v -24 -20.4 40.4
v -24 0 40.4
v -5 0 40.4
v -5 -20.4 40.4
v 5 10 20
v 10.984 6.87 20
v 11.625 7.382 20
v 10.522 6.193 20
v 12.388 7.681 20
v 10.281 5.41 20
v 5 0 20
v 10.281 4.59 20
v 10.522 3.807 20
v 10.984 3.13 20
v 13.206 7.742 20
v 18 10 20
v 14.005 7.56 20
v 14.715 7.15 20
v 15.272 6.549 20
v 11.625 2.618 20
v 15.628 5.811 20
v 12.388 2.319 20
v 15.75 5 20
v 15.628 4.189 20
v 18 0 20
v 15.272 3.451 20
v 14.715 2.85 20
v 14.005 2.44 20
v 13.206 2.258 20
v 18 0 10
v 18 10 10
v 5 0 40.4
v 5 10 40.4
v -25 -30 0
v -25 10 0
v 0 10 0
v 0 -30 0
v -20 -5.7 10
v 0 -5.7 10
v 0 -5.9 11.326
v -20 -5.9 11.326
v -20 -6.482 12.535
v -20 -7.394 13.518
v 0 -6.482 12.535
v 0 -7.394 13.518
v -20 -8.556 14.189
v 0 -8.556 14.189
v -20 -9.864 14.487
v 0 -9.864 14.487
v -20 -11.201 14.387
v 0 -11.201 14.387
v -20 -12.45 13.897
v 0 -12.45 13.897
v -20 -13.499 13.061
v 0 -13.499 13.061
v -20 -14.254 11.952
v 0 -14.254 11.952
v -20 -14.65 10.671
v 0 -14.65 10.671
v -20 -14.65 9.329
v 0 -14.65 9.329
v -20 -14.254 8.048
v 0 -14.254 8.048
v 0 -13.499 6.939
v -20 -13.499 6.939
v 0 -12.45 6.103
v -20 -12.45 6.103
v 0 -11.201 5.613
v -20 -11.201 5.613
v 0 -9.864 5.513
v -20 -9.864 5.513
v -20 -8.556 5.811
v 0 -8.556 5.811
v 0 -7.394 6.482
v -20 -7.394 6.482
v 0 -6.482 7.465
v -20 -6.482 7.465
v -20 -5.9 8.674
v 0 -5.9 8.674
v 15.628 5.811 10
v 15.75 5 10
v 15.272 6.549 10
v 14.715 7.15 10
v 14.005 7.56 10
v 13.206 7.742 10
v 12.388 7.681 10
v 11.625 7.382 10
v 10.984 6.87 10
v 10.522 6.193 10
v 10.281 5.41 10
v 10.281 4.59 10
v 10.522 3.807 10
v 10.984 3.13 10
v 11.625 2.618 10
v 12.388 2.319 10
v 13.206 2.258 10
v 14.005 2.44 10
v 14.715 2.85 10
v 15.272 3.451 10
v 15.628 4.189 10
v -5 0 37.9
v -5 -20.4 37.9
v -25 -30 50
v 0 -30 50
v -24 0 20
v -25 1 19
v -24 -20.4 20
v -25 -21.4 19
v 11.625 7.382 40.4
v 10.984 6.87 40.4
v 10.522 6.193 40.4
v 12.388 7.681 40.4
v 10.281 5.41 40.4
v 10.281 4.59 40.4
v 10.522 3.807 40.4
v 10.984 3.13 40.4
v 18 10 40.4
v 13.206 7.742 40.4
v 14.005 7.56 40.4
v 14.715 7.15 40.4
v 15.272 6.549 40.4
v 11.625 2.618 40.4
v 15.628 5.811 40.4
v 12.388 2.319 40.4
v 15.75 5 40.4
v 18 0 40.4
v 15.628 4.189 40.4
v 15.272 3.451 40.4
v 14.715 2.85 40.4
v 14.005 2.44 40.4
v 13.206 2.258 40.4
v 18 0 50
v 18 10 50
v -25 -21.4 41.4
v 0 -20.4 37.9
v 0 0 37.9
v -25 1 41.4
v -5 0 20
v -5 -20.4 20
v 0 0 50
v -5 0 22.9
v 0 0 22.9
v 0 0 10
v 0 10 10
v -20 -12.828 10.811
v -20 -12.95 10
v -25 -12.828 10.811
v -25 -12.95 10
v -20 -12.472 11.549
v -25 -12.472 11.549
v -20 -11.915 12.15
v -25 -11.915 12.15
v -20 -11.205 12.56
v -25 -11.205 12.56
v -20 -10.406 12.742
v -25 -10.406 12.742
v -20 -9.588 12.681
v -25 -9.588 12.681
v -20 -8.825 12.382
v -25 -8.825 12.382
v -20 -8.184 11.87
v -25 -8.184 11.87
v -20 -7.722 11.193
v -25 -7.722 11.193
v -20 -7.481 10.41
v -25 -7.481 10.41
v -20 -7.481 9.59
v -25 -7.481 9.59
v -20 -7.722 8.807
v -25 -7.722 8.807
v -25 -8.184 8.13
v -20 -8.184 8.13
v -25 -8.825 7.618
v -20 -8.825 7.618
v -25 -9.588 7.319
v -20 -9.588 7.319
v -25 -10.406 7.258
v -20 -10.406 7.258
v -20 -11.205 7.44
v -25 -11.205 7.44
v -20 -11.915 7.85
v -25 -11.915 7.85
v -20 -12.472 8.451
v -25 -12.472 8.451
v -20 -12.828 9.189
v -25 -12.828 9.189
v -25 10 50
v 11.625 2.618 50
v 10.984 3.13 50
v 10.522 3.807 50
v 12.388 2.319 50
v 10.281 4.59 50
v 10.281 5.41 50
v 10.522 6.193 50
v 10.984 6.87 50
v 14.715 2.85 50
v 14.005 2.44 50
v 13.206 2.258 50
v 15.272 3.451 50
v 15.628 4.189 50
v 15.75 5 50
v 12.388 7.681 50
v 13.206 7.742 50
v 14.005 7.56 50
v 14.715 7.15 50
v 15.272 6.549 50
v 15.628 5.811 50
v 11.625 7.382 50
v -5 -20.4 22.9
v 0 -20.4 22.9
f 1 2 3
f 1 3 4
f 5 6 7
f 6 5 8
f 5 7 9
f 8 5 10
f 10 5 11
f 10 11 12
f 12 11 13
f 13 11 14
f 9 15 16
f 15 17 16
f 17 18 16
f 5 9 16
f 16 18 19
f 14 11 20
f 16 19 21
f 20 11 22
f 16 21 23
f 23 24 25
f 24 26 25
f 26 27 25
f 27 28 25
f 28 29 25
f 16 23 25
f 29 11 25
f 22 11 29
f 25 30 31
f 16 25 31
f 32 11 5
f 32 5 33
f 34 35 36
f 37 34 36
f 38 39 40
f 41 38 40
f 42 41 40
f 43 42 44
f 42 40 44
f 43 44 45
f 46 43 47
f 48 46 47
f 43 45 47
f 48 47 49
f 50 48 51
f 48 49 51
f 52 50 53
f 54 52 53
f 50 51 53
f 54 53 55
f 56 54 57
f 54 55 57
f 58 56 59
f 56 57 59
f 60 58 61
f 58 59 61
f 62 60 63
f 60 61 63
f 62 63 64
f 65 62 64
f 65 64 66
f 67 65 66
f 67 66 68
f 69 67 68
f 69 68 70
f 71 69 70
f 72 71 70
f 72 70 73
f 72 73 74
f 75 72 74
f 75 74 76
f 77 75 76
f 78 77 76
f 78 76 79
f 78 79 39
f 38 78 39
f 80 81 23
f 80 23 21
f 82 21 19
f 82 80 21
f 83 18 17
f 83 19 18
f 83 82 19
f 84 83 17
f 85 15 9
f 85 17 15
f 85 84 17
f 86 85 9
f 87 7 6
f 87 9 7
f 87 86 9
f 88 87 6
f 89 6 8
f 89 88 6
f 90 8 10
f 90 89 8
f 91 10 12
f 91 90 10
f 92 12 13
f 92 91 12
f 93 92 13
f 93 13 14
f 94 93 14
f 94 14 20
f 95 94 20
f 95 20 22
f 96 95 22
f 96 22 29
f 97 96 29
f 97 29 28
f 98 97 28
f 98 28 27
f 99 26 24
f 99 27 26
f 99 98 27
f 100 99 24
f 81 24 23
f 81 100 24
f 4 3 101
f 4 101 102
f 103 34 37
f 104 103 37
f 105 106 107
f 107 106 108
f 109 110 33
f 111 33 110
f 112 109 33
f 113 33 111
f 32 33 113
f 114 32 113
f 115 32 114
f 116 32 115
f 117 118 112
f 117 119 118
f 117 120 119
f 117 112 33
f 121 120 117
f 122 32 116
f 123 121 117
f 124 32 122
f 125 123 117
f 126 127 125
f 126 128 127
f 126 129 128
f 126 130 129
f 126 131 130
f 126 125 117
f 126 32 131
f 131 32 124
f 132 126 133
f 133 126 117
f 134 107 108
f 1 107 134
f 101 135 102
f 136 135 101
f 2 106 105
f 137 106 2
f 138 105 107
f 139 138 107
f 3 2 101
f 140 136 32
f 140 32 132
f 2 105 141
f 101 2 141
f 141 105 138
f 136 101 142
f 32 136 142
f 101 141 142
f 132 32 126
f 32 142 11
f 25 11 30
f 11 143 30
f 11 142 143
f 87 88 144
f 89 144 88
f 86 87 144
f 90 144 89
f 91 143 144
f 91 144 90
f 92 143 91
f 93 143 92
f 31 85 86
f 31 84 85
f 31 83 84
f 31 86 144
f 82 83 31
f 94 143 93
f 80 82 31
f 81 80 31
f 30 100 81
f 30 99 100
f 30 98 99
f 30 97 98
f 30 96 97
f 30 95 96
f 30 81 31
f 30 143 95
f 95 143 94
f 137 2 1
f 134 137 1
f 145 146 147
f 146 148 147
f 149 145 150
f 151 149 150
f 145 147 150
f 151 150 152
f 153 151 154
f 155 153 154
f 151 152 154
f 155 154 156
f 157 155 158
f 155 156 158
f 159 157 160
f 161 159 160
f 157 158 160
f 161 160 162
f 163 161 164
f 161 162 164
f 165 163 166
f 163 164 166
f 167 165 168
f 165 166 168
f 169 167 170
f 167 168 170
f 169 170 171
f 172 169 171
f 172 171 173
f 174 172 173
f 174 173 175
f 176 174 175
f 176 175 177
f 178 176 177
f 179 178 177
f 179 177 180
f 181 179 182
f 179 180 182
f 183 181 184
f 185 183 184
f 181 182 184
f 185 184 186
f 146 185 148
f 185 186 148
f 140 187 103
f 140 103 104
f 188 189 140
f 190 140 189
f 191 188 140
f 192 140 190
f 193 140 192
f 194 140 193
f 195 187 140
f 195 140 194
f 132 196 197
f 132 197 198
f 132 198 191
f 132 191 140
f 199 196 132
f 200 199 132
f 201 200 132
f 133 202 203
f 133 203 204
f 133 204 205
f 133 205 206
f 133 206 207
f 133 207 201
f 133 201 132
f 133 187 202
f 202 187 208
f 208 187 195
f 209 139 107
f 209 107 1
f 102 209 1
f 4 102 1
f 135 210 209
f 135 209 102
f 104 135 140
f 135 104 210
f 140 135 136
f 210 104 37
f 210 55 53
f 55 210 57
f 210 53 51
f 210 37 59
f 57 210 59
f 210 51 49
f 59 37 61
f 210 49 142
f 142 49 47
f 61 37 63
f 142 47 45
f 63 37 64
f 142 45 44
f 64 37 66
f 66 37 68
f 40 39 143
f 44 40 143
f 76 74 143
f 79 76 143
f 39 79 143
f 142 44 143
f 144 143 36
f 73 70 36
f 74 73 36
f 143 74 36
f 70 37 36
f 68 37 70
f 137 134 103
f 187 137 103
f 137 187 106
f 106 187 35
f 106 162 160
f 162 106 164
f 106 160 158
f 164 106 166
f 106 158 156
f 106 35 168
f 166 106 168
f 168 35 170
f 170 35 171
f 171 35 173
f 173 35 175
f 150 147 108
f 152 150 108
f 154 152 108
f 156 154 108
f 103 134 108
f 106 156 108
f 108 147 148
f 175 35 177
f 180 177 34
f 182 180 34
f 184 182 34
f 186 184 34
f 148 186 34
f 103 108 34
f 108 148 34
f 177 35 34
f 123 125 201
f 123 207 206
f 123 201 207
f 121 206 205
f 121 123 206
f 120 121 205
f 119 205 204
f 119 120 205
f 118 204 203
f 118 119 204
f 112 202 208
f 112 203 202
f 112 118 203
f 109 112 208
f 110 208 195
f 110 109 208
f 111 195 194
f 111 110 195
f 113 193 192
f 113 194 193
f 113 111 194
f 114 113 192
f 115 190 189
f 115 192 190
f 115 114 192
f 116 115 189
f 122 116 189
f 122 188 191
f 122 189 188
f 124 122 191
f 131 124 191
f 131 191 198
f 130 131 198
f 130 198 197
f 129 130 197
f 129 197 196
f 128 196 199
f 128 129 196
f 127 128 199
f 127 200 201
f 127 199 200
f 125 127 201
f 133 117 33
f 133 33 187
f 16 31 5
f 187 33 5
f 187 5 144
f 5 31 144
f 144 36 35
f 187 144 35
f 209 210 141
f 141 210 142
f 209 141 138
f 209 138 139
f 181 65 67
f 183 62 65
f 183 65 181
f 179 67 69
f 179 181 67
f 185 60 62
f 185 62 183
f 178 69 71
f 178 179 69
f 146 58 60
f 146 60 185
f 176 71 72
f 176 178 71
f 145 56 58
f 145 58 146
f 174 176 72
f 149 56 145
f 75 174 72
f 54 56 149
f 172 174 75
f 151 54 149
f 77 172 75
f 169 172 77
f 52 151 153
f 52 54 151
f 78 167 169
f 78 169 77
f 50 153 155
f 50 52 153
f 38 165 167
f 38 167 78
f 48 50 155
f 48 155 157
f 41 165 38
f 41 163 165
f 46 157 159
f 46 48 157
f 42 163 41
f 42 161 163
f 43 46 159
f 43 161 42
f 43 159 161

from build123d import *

# Parameters (mm, degrees)
PAD_DEPTH        = 50
SKETCH001_W      = 13
SKETCH001_H      = 20.4
SKETCH001_W_2    = 18
SKETCH001_H_2    = 10
POCKET_DEPTH     = 10.001
SKETCH002_W      = 20.4
SKETCH002_H      = 20.4
POCKET001_DEPTH  = 20
SKETCH003_W      = 20.4
SKETCH003_H      = 15
POCKET002_DEPTH  = 5
HOLE_D           = 5.5
HOLE_CBORE_D     = 9
HOLE_CBORE_DEPTH = 20
SKETCH005_R      = 2.75
HOLE001_DEPTH    = 50.001
CHAMFER_SIZE     = 1


with BuildPart() as part:
    # Sketch → Pad (new body)
    with BuildSketch(Plane.XY):
        Polygon((0, 0), (18, 0), (18, 10), (-25, 10), (-25, -30), (0, -30), align=None)
    extrude(amount=PAD_DEPTH)

    # Sketch001 → Pocket (cut, through all)
    with BuildSketch(Plane.XZ):
        with Locations((11.5, 30.2)):
            Rectangle(SKETCH001_W, SKETCH001_H)
        with Locations((9, 5)):
            Rectangle(SKETCH001_W_2, SKETCH001_H_2)
    extrude(amount=-POCKET_DEPTH, mode=Mode.SUBTRACT)

    # Sketch002 (on Face12 of Pocket) → Pocket001 (cut)
    with BuildSketch(Plane(origin=(-25, 0, 0), x_dir=(0, -1, 0), z_dir=(-1, 0, 0))):
        with Locations((10.2, 30.2)):
            Rectangle(SKETCH002_W, SKETCH002_H)
    extrude(amount=-POCKET001_DEPTH, mode=Mode.SUBTRACT)

    # Sketch003 → Pocket002 (cut)
    with BuildSketch(Plane.YZ):
        with Locations((-10.2, 30.4)):
            Rectangle(SKETCH003_W, SKETCH003_H)
    extrude(amount=-POCKET002_DEPTH, mode=Mode.SUBTRACT)

    # Hole (through all)
    with Locations(Plane.YZ):
        with Locations((-10.2, 10)):
            CounterBoreHole(HOLE_D / 2, HOLE_CBORE_D / 2, HOLE_CBORE_DEPTH)

    # Sketch005 → Hole001 (cut, through all)
    with BuildSketch(Plane.XY):
        with Locations((13, 5)):
            Circle(SKETCH005_R)
    extrude(amount=HOLE001_DEPTH, mode=Mode.SUBTRACT)

    # Chamfer
    chamfer_edges = [part.edges().sort_by_distance(p)[0] for p in [
        (-25, -10.2, 40.4),
        (-25, 0, 30.2),
        (-25, -10.2, 20),
        (-25, -20.4, 30.2),
    ]]
    chamfer(chamfer_edges, length=CHAMFER_SIZE)


solid = part.part
